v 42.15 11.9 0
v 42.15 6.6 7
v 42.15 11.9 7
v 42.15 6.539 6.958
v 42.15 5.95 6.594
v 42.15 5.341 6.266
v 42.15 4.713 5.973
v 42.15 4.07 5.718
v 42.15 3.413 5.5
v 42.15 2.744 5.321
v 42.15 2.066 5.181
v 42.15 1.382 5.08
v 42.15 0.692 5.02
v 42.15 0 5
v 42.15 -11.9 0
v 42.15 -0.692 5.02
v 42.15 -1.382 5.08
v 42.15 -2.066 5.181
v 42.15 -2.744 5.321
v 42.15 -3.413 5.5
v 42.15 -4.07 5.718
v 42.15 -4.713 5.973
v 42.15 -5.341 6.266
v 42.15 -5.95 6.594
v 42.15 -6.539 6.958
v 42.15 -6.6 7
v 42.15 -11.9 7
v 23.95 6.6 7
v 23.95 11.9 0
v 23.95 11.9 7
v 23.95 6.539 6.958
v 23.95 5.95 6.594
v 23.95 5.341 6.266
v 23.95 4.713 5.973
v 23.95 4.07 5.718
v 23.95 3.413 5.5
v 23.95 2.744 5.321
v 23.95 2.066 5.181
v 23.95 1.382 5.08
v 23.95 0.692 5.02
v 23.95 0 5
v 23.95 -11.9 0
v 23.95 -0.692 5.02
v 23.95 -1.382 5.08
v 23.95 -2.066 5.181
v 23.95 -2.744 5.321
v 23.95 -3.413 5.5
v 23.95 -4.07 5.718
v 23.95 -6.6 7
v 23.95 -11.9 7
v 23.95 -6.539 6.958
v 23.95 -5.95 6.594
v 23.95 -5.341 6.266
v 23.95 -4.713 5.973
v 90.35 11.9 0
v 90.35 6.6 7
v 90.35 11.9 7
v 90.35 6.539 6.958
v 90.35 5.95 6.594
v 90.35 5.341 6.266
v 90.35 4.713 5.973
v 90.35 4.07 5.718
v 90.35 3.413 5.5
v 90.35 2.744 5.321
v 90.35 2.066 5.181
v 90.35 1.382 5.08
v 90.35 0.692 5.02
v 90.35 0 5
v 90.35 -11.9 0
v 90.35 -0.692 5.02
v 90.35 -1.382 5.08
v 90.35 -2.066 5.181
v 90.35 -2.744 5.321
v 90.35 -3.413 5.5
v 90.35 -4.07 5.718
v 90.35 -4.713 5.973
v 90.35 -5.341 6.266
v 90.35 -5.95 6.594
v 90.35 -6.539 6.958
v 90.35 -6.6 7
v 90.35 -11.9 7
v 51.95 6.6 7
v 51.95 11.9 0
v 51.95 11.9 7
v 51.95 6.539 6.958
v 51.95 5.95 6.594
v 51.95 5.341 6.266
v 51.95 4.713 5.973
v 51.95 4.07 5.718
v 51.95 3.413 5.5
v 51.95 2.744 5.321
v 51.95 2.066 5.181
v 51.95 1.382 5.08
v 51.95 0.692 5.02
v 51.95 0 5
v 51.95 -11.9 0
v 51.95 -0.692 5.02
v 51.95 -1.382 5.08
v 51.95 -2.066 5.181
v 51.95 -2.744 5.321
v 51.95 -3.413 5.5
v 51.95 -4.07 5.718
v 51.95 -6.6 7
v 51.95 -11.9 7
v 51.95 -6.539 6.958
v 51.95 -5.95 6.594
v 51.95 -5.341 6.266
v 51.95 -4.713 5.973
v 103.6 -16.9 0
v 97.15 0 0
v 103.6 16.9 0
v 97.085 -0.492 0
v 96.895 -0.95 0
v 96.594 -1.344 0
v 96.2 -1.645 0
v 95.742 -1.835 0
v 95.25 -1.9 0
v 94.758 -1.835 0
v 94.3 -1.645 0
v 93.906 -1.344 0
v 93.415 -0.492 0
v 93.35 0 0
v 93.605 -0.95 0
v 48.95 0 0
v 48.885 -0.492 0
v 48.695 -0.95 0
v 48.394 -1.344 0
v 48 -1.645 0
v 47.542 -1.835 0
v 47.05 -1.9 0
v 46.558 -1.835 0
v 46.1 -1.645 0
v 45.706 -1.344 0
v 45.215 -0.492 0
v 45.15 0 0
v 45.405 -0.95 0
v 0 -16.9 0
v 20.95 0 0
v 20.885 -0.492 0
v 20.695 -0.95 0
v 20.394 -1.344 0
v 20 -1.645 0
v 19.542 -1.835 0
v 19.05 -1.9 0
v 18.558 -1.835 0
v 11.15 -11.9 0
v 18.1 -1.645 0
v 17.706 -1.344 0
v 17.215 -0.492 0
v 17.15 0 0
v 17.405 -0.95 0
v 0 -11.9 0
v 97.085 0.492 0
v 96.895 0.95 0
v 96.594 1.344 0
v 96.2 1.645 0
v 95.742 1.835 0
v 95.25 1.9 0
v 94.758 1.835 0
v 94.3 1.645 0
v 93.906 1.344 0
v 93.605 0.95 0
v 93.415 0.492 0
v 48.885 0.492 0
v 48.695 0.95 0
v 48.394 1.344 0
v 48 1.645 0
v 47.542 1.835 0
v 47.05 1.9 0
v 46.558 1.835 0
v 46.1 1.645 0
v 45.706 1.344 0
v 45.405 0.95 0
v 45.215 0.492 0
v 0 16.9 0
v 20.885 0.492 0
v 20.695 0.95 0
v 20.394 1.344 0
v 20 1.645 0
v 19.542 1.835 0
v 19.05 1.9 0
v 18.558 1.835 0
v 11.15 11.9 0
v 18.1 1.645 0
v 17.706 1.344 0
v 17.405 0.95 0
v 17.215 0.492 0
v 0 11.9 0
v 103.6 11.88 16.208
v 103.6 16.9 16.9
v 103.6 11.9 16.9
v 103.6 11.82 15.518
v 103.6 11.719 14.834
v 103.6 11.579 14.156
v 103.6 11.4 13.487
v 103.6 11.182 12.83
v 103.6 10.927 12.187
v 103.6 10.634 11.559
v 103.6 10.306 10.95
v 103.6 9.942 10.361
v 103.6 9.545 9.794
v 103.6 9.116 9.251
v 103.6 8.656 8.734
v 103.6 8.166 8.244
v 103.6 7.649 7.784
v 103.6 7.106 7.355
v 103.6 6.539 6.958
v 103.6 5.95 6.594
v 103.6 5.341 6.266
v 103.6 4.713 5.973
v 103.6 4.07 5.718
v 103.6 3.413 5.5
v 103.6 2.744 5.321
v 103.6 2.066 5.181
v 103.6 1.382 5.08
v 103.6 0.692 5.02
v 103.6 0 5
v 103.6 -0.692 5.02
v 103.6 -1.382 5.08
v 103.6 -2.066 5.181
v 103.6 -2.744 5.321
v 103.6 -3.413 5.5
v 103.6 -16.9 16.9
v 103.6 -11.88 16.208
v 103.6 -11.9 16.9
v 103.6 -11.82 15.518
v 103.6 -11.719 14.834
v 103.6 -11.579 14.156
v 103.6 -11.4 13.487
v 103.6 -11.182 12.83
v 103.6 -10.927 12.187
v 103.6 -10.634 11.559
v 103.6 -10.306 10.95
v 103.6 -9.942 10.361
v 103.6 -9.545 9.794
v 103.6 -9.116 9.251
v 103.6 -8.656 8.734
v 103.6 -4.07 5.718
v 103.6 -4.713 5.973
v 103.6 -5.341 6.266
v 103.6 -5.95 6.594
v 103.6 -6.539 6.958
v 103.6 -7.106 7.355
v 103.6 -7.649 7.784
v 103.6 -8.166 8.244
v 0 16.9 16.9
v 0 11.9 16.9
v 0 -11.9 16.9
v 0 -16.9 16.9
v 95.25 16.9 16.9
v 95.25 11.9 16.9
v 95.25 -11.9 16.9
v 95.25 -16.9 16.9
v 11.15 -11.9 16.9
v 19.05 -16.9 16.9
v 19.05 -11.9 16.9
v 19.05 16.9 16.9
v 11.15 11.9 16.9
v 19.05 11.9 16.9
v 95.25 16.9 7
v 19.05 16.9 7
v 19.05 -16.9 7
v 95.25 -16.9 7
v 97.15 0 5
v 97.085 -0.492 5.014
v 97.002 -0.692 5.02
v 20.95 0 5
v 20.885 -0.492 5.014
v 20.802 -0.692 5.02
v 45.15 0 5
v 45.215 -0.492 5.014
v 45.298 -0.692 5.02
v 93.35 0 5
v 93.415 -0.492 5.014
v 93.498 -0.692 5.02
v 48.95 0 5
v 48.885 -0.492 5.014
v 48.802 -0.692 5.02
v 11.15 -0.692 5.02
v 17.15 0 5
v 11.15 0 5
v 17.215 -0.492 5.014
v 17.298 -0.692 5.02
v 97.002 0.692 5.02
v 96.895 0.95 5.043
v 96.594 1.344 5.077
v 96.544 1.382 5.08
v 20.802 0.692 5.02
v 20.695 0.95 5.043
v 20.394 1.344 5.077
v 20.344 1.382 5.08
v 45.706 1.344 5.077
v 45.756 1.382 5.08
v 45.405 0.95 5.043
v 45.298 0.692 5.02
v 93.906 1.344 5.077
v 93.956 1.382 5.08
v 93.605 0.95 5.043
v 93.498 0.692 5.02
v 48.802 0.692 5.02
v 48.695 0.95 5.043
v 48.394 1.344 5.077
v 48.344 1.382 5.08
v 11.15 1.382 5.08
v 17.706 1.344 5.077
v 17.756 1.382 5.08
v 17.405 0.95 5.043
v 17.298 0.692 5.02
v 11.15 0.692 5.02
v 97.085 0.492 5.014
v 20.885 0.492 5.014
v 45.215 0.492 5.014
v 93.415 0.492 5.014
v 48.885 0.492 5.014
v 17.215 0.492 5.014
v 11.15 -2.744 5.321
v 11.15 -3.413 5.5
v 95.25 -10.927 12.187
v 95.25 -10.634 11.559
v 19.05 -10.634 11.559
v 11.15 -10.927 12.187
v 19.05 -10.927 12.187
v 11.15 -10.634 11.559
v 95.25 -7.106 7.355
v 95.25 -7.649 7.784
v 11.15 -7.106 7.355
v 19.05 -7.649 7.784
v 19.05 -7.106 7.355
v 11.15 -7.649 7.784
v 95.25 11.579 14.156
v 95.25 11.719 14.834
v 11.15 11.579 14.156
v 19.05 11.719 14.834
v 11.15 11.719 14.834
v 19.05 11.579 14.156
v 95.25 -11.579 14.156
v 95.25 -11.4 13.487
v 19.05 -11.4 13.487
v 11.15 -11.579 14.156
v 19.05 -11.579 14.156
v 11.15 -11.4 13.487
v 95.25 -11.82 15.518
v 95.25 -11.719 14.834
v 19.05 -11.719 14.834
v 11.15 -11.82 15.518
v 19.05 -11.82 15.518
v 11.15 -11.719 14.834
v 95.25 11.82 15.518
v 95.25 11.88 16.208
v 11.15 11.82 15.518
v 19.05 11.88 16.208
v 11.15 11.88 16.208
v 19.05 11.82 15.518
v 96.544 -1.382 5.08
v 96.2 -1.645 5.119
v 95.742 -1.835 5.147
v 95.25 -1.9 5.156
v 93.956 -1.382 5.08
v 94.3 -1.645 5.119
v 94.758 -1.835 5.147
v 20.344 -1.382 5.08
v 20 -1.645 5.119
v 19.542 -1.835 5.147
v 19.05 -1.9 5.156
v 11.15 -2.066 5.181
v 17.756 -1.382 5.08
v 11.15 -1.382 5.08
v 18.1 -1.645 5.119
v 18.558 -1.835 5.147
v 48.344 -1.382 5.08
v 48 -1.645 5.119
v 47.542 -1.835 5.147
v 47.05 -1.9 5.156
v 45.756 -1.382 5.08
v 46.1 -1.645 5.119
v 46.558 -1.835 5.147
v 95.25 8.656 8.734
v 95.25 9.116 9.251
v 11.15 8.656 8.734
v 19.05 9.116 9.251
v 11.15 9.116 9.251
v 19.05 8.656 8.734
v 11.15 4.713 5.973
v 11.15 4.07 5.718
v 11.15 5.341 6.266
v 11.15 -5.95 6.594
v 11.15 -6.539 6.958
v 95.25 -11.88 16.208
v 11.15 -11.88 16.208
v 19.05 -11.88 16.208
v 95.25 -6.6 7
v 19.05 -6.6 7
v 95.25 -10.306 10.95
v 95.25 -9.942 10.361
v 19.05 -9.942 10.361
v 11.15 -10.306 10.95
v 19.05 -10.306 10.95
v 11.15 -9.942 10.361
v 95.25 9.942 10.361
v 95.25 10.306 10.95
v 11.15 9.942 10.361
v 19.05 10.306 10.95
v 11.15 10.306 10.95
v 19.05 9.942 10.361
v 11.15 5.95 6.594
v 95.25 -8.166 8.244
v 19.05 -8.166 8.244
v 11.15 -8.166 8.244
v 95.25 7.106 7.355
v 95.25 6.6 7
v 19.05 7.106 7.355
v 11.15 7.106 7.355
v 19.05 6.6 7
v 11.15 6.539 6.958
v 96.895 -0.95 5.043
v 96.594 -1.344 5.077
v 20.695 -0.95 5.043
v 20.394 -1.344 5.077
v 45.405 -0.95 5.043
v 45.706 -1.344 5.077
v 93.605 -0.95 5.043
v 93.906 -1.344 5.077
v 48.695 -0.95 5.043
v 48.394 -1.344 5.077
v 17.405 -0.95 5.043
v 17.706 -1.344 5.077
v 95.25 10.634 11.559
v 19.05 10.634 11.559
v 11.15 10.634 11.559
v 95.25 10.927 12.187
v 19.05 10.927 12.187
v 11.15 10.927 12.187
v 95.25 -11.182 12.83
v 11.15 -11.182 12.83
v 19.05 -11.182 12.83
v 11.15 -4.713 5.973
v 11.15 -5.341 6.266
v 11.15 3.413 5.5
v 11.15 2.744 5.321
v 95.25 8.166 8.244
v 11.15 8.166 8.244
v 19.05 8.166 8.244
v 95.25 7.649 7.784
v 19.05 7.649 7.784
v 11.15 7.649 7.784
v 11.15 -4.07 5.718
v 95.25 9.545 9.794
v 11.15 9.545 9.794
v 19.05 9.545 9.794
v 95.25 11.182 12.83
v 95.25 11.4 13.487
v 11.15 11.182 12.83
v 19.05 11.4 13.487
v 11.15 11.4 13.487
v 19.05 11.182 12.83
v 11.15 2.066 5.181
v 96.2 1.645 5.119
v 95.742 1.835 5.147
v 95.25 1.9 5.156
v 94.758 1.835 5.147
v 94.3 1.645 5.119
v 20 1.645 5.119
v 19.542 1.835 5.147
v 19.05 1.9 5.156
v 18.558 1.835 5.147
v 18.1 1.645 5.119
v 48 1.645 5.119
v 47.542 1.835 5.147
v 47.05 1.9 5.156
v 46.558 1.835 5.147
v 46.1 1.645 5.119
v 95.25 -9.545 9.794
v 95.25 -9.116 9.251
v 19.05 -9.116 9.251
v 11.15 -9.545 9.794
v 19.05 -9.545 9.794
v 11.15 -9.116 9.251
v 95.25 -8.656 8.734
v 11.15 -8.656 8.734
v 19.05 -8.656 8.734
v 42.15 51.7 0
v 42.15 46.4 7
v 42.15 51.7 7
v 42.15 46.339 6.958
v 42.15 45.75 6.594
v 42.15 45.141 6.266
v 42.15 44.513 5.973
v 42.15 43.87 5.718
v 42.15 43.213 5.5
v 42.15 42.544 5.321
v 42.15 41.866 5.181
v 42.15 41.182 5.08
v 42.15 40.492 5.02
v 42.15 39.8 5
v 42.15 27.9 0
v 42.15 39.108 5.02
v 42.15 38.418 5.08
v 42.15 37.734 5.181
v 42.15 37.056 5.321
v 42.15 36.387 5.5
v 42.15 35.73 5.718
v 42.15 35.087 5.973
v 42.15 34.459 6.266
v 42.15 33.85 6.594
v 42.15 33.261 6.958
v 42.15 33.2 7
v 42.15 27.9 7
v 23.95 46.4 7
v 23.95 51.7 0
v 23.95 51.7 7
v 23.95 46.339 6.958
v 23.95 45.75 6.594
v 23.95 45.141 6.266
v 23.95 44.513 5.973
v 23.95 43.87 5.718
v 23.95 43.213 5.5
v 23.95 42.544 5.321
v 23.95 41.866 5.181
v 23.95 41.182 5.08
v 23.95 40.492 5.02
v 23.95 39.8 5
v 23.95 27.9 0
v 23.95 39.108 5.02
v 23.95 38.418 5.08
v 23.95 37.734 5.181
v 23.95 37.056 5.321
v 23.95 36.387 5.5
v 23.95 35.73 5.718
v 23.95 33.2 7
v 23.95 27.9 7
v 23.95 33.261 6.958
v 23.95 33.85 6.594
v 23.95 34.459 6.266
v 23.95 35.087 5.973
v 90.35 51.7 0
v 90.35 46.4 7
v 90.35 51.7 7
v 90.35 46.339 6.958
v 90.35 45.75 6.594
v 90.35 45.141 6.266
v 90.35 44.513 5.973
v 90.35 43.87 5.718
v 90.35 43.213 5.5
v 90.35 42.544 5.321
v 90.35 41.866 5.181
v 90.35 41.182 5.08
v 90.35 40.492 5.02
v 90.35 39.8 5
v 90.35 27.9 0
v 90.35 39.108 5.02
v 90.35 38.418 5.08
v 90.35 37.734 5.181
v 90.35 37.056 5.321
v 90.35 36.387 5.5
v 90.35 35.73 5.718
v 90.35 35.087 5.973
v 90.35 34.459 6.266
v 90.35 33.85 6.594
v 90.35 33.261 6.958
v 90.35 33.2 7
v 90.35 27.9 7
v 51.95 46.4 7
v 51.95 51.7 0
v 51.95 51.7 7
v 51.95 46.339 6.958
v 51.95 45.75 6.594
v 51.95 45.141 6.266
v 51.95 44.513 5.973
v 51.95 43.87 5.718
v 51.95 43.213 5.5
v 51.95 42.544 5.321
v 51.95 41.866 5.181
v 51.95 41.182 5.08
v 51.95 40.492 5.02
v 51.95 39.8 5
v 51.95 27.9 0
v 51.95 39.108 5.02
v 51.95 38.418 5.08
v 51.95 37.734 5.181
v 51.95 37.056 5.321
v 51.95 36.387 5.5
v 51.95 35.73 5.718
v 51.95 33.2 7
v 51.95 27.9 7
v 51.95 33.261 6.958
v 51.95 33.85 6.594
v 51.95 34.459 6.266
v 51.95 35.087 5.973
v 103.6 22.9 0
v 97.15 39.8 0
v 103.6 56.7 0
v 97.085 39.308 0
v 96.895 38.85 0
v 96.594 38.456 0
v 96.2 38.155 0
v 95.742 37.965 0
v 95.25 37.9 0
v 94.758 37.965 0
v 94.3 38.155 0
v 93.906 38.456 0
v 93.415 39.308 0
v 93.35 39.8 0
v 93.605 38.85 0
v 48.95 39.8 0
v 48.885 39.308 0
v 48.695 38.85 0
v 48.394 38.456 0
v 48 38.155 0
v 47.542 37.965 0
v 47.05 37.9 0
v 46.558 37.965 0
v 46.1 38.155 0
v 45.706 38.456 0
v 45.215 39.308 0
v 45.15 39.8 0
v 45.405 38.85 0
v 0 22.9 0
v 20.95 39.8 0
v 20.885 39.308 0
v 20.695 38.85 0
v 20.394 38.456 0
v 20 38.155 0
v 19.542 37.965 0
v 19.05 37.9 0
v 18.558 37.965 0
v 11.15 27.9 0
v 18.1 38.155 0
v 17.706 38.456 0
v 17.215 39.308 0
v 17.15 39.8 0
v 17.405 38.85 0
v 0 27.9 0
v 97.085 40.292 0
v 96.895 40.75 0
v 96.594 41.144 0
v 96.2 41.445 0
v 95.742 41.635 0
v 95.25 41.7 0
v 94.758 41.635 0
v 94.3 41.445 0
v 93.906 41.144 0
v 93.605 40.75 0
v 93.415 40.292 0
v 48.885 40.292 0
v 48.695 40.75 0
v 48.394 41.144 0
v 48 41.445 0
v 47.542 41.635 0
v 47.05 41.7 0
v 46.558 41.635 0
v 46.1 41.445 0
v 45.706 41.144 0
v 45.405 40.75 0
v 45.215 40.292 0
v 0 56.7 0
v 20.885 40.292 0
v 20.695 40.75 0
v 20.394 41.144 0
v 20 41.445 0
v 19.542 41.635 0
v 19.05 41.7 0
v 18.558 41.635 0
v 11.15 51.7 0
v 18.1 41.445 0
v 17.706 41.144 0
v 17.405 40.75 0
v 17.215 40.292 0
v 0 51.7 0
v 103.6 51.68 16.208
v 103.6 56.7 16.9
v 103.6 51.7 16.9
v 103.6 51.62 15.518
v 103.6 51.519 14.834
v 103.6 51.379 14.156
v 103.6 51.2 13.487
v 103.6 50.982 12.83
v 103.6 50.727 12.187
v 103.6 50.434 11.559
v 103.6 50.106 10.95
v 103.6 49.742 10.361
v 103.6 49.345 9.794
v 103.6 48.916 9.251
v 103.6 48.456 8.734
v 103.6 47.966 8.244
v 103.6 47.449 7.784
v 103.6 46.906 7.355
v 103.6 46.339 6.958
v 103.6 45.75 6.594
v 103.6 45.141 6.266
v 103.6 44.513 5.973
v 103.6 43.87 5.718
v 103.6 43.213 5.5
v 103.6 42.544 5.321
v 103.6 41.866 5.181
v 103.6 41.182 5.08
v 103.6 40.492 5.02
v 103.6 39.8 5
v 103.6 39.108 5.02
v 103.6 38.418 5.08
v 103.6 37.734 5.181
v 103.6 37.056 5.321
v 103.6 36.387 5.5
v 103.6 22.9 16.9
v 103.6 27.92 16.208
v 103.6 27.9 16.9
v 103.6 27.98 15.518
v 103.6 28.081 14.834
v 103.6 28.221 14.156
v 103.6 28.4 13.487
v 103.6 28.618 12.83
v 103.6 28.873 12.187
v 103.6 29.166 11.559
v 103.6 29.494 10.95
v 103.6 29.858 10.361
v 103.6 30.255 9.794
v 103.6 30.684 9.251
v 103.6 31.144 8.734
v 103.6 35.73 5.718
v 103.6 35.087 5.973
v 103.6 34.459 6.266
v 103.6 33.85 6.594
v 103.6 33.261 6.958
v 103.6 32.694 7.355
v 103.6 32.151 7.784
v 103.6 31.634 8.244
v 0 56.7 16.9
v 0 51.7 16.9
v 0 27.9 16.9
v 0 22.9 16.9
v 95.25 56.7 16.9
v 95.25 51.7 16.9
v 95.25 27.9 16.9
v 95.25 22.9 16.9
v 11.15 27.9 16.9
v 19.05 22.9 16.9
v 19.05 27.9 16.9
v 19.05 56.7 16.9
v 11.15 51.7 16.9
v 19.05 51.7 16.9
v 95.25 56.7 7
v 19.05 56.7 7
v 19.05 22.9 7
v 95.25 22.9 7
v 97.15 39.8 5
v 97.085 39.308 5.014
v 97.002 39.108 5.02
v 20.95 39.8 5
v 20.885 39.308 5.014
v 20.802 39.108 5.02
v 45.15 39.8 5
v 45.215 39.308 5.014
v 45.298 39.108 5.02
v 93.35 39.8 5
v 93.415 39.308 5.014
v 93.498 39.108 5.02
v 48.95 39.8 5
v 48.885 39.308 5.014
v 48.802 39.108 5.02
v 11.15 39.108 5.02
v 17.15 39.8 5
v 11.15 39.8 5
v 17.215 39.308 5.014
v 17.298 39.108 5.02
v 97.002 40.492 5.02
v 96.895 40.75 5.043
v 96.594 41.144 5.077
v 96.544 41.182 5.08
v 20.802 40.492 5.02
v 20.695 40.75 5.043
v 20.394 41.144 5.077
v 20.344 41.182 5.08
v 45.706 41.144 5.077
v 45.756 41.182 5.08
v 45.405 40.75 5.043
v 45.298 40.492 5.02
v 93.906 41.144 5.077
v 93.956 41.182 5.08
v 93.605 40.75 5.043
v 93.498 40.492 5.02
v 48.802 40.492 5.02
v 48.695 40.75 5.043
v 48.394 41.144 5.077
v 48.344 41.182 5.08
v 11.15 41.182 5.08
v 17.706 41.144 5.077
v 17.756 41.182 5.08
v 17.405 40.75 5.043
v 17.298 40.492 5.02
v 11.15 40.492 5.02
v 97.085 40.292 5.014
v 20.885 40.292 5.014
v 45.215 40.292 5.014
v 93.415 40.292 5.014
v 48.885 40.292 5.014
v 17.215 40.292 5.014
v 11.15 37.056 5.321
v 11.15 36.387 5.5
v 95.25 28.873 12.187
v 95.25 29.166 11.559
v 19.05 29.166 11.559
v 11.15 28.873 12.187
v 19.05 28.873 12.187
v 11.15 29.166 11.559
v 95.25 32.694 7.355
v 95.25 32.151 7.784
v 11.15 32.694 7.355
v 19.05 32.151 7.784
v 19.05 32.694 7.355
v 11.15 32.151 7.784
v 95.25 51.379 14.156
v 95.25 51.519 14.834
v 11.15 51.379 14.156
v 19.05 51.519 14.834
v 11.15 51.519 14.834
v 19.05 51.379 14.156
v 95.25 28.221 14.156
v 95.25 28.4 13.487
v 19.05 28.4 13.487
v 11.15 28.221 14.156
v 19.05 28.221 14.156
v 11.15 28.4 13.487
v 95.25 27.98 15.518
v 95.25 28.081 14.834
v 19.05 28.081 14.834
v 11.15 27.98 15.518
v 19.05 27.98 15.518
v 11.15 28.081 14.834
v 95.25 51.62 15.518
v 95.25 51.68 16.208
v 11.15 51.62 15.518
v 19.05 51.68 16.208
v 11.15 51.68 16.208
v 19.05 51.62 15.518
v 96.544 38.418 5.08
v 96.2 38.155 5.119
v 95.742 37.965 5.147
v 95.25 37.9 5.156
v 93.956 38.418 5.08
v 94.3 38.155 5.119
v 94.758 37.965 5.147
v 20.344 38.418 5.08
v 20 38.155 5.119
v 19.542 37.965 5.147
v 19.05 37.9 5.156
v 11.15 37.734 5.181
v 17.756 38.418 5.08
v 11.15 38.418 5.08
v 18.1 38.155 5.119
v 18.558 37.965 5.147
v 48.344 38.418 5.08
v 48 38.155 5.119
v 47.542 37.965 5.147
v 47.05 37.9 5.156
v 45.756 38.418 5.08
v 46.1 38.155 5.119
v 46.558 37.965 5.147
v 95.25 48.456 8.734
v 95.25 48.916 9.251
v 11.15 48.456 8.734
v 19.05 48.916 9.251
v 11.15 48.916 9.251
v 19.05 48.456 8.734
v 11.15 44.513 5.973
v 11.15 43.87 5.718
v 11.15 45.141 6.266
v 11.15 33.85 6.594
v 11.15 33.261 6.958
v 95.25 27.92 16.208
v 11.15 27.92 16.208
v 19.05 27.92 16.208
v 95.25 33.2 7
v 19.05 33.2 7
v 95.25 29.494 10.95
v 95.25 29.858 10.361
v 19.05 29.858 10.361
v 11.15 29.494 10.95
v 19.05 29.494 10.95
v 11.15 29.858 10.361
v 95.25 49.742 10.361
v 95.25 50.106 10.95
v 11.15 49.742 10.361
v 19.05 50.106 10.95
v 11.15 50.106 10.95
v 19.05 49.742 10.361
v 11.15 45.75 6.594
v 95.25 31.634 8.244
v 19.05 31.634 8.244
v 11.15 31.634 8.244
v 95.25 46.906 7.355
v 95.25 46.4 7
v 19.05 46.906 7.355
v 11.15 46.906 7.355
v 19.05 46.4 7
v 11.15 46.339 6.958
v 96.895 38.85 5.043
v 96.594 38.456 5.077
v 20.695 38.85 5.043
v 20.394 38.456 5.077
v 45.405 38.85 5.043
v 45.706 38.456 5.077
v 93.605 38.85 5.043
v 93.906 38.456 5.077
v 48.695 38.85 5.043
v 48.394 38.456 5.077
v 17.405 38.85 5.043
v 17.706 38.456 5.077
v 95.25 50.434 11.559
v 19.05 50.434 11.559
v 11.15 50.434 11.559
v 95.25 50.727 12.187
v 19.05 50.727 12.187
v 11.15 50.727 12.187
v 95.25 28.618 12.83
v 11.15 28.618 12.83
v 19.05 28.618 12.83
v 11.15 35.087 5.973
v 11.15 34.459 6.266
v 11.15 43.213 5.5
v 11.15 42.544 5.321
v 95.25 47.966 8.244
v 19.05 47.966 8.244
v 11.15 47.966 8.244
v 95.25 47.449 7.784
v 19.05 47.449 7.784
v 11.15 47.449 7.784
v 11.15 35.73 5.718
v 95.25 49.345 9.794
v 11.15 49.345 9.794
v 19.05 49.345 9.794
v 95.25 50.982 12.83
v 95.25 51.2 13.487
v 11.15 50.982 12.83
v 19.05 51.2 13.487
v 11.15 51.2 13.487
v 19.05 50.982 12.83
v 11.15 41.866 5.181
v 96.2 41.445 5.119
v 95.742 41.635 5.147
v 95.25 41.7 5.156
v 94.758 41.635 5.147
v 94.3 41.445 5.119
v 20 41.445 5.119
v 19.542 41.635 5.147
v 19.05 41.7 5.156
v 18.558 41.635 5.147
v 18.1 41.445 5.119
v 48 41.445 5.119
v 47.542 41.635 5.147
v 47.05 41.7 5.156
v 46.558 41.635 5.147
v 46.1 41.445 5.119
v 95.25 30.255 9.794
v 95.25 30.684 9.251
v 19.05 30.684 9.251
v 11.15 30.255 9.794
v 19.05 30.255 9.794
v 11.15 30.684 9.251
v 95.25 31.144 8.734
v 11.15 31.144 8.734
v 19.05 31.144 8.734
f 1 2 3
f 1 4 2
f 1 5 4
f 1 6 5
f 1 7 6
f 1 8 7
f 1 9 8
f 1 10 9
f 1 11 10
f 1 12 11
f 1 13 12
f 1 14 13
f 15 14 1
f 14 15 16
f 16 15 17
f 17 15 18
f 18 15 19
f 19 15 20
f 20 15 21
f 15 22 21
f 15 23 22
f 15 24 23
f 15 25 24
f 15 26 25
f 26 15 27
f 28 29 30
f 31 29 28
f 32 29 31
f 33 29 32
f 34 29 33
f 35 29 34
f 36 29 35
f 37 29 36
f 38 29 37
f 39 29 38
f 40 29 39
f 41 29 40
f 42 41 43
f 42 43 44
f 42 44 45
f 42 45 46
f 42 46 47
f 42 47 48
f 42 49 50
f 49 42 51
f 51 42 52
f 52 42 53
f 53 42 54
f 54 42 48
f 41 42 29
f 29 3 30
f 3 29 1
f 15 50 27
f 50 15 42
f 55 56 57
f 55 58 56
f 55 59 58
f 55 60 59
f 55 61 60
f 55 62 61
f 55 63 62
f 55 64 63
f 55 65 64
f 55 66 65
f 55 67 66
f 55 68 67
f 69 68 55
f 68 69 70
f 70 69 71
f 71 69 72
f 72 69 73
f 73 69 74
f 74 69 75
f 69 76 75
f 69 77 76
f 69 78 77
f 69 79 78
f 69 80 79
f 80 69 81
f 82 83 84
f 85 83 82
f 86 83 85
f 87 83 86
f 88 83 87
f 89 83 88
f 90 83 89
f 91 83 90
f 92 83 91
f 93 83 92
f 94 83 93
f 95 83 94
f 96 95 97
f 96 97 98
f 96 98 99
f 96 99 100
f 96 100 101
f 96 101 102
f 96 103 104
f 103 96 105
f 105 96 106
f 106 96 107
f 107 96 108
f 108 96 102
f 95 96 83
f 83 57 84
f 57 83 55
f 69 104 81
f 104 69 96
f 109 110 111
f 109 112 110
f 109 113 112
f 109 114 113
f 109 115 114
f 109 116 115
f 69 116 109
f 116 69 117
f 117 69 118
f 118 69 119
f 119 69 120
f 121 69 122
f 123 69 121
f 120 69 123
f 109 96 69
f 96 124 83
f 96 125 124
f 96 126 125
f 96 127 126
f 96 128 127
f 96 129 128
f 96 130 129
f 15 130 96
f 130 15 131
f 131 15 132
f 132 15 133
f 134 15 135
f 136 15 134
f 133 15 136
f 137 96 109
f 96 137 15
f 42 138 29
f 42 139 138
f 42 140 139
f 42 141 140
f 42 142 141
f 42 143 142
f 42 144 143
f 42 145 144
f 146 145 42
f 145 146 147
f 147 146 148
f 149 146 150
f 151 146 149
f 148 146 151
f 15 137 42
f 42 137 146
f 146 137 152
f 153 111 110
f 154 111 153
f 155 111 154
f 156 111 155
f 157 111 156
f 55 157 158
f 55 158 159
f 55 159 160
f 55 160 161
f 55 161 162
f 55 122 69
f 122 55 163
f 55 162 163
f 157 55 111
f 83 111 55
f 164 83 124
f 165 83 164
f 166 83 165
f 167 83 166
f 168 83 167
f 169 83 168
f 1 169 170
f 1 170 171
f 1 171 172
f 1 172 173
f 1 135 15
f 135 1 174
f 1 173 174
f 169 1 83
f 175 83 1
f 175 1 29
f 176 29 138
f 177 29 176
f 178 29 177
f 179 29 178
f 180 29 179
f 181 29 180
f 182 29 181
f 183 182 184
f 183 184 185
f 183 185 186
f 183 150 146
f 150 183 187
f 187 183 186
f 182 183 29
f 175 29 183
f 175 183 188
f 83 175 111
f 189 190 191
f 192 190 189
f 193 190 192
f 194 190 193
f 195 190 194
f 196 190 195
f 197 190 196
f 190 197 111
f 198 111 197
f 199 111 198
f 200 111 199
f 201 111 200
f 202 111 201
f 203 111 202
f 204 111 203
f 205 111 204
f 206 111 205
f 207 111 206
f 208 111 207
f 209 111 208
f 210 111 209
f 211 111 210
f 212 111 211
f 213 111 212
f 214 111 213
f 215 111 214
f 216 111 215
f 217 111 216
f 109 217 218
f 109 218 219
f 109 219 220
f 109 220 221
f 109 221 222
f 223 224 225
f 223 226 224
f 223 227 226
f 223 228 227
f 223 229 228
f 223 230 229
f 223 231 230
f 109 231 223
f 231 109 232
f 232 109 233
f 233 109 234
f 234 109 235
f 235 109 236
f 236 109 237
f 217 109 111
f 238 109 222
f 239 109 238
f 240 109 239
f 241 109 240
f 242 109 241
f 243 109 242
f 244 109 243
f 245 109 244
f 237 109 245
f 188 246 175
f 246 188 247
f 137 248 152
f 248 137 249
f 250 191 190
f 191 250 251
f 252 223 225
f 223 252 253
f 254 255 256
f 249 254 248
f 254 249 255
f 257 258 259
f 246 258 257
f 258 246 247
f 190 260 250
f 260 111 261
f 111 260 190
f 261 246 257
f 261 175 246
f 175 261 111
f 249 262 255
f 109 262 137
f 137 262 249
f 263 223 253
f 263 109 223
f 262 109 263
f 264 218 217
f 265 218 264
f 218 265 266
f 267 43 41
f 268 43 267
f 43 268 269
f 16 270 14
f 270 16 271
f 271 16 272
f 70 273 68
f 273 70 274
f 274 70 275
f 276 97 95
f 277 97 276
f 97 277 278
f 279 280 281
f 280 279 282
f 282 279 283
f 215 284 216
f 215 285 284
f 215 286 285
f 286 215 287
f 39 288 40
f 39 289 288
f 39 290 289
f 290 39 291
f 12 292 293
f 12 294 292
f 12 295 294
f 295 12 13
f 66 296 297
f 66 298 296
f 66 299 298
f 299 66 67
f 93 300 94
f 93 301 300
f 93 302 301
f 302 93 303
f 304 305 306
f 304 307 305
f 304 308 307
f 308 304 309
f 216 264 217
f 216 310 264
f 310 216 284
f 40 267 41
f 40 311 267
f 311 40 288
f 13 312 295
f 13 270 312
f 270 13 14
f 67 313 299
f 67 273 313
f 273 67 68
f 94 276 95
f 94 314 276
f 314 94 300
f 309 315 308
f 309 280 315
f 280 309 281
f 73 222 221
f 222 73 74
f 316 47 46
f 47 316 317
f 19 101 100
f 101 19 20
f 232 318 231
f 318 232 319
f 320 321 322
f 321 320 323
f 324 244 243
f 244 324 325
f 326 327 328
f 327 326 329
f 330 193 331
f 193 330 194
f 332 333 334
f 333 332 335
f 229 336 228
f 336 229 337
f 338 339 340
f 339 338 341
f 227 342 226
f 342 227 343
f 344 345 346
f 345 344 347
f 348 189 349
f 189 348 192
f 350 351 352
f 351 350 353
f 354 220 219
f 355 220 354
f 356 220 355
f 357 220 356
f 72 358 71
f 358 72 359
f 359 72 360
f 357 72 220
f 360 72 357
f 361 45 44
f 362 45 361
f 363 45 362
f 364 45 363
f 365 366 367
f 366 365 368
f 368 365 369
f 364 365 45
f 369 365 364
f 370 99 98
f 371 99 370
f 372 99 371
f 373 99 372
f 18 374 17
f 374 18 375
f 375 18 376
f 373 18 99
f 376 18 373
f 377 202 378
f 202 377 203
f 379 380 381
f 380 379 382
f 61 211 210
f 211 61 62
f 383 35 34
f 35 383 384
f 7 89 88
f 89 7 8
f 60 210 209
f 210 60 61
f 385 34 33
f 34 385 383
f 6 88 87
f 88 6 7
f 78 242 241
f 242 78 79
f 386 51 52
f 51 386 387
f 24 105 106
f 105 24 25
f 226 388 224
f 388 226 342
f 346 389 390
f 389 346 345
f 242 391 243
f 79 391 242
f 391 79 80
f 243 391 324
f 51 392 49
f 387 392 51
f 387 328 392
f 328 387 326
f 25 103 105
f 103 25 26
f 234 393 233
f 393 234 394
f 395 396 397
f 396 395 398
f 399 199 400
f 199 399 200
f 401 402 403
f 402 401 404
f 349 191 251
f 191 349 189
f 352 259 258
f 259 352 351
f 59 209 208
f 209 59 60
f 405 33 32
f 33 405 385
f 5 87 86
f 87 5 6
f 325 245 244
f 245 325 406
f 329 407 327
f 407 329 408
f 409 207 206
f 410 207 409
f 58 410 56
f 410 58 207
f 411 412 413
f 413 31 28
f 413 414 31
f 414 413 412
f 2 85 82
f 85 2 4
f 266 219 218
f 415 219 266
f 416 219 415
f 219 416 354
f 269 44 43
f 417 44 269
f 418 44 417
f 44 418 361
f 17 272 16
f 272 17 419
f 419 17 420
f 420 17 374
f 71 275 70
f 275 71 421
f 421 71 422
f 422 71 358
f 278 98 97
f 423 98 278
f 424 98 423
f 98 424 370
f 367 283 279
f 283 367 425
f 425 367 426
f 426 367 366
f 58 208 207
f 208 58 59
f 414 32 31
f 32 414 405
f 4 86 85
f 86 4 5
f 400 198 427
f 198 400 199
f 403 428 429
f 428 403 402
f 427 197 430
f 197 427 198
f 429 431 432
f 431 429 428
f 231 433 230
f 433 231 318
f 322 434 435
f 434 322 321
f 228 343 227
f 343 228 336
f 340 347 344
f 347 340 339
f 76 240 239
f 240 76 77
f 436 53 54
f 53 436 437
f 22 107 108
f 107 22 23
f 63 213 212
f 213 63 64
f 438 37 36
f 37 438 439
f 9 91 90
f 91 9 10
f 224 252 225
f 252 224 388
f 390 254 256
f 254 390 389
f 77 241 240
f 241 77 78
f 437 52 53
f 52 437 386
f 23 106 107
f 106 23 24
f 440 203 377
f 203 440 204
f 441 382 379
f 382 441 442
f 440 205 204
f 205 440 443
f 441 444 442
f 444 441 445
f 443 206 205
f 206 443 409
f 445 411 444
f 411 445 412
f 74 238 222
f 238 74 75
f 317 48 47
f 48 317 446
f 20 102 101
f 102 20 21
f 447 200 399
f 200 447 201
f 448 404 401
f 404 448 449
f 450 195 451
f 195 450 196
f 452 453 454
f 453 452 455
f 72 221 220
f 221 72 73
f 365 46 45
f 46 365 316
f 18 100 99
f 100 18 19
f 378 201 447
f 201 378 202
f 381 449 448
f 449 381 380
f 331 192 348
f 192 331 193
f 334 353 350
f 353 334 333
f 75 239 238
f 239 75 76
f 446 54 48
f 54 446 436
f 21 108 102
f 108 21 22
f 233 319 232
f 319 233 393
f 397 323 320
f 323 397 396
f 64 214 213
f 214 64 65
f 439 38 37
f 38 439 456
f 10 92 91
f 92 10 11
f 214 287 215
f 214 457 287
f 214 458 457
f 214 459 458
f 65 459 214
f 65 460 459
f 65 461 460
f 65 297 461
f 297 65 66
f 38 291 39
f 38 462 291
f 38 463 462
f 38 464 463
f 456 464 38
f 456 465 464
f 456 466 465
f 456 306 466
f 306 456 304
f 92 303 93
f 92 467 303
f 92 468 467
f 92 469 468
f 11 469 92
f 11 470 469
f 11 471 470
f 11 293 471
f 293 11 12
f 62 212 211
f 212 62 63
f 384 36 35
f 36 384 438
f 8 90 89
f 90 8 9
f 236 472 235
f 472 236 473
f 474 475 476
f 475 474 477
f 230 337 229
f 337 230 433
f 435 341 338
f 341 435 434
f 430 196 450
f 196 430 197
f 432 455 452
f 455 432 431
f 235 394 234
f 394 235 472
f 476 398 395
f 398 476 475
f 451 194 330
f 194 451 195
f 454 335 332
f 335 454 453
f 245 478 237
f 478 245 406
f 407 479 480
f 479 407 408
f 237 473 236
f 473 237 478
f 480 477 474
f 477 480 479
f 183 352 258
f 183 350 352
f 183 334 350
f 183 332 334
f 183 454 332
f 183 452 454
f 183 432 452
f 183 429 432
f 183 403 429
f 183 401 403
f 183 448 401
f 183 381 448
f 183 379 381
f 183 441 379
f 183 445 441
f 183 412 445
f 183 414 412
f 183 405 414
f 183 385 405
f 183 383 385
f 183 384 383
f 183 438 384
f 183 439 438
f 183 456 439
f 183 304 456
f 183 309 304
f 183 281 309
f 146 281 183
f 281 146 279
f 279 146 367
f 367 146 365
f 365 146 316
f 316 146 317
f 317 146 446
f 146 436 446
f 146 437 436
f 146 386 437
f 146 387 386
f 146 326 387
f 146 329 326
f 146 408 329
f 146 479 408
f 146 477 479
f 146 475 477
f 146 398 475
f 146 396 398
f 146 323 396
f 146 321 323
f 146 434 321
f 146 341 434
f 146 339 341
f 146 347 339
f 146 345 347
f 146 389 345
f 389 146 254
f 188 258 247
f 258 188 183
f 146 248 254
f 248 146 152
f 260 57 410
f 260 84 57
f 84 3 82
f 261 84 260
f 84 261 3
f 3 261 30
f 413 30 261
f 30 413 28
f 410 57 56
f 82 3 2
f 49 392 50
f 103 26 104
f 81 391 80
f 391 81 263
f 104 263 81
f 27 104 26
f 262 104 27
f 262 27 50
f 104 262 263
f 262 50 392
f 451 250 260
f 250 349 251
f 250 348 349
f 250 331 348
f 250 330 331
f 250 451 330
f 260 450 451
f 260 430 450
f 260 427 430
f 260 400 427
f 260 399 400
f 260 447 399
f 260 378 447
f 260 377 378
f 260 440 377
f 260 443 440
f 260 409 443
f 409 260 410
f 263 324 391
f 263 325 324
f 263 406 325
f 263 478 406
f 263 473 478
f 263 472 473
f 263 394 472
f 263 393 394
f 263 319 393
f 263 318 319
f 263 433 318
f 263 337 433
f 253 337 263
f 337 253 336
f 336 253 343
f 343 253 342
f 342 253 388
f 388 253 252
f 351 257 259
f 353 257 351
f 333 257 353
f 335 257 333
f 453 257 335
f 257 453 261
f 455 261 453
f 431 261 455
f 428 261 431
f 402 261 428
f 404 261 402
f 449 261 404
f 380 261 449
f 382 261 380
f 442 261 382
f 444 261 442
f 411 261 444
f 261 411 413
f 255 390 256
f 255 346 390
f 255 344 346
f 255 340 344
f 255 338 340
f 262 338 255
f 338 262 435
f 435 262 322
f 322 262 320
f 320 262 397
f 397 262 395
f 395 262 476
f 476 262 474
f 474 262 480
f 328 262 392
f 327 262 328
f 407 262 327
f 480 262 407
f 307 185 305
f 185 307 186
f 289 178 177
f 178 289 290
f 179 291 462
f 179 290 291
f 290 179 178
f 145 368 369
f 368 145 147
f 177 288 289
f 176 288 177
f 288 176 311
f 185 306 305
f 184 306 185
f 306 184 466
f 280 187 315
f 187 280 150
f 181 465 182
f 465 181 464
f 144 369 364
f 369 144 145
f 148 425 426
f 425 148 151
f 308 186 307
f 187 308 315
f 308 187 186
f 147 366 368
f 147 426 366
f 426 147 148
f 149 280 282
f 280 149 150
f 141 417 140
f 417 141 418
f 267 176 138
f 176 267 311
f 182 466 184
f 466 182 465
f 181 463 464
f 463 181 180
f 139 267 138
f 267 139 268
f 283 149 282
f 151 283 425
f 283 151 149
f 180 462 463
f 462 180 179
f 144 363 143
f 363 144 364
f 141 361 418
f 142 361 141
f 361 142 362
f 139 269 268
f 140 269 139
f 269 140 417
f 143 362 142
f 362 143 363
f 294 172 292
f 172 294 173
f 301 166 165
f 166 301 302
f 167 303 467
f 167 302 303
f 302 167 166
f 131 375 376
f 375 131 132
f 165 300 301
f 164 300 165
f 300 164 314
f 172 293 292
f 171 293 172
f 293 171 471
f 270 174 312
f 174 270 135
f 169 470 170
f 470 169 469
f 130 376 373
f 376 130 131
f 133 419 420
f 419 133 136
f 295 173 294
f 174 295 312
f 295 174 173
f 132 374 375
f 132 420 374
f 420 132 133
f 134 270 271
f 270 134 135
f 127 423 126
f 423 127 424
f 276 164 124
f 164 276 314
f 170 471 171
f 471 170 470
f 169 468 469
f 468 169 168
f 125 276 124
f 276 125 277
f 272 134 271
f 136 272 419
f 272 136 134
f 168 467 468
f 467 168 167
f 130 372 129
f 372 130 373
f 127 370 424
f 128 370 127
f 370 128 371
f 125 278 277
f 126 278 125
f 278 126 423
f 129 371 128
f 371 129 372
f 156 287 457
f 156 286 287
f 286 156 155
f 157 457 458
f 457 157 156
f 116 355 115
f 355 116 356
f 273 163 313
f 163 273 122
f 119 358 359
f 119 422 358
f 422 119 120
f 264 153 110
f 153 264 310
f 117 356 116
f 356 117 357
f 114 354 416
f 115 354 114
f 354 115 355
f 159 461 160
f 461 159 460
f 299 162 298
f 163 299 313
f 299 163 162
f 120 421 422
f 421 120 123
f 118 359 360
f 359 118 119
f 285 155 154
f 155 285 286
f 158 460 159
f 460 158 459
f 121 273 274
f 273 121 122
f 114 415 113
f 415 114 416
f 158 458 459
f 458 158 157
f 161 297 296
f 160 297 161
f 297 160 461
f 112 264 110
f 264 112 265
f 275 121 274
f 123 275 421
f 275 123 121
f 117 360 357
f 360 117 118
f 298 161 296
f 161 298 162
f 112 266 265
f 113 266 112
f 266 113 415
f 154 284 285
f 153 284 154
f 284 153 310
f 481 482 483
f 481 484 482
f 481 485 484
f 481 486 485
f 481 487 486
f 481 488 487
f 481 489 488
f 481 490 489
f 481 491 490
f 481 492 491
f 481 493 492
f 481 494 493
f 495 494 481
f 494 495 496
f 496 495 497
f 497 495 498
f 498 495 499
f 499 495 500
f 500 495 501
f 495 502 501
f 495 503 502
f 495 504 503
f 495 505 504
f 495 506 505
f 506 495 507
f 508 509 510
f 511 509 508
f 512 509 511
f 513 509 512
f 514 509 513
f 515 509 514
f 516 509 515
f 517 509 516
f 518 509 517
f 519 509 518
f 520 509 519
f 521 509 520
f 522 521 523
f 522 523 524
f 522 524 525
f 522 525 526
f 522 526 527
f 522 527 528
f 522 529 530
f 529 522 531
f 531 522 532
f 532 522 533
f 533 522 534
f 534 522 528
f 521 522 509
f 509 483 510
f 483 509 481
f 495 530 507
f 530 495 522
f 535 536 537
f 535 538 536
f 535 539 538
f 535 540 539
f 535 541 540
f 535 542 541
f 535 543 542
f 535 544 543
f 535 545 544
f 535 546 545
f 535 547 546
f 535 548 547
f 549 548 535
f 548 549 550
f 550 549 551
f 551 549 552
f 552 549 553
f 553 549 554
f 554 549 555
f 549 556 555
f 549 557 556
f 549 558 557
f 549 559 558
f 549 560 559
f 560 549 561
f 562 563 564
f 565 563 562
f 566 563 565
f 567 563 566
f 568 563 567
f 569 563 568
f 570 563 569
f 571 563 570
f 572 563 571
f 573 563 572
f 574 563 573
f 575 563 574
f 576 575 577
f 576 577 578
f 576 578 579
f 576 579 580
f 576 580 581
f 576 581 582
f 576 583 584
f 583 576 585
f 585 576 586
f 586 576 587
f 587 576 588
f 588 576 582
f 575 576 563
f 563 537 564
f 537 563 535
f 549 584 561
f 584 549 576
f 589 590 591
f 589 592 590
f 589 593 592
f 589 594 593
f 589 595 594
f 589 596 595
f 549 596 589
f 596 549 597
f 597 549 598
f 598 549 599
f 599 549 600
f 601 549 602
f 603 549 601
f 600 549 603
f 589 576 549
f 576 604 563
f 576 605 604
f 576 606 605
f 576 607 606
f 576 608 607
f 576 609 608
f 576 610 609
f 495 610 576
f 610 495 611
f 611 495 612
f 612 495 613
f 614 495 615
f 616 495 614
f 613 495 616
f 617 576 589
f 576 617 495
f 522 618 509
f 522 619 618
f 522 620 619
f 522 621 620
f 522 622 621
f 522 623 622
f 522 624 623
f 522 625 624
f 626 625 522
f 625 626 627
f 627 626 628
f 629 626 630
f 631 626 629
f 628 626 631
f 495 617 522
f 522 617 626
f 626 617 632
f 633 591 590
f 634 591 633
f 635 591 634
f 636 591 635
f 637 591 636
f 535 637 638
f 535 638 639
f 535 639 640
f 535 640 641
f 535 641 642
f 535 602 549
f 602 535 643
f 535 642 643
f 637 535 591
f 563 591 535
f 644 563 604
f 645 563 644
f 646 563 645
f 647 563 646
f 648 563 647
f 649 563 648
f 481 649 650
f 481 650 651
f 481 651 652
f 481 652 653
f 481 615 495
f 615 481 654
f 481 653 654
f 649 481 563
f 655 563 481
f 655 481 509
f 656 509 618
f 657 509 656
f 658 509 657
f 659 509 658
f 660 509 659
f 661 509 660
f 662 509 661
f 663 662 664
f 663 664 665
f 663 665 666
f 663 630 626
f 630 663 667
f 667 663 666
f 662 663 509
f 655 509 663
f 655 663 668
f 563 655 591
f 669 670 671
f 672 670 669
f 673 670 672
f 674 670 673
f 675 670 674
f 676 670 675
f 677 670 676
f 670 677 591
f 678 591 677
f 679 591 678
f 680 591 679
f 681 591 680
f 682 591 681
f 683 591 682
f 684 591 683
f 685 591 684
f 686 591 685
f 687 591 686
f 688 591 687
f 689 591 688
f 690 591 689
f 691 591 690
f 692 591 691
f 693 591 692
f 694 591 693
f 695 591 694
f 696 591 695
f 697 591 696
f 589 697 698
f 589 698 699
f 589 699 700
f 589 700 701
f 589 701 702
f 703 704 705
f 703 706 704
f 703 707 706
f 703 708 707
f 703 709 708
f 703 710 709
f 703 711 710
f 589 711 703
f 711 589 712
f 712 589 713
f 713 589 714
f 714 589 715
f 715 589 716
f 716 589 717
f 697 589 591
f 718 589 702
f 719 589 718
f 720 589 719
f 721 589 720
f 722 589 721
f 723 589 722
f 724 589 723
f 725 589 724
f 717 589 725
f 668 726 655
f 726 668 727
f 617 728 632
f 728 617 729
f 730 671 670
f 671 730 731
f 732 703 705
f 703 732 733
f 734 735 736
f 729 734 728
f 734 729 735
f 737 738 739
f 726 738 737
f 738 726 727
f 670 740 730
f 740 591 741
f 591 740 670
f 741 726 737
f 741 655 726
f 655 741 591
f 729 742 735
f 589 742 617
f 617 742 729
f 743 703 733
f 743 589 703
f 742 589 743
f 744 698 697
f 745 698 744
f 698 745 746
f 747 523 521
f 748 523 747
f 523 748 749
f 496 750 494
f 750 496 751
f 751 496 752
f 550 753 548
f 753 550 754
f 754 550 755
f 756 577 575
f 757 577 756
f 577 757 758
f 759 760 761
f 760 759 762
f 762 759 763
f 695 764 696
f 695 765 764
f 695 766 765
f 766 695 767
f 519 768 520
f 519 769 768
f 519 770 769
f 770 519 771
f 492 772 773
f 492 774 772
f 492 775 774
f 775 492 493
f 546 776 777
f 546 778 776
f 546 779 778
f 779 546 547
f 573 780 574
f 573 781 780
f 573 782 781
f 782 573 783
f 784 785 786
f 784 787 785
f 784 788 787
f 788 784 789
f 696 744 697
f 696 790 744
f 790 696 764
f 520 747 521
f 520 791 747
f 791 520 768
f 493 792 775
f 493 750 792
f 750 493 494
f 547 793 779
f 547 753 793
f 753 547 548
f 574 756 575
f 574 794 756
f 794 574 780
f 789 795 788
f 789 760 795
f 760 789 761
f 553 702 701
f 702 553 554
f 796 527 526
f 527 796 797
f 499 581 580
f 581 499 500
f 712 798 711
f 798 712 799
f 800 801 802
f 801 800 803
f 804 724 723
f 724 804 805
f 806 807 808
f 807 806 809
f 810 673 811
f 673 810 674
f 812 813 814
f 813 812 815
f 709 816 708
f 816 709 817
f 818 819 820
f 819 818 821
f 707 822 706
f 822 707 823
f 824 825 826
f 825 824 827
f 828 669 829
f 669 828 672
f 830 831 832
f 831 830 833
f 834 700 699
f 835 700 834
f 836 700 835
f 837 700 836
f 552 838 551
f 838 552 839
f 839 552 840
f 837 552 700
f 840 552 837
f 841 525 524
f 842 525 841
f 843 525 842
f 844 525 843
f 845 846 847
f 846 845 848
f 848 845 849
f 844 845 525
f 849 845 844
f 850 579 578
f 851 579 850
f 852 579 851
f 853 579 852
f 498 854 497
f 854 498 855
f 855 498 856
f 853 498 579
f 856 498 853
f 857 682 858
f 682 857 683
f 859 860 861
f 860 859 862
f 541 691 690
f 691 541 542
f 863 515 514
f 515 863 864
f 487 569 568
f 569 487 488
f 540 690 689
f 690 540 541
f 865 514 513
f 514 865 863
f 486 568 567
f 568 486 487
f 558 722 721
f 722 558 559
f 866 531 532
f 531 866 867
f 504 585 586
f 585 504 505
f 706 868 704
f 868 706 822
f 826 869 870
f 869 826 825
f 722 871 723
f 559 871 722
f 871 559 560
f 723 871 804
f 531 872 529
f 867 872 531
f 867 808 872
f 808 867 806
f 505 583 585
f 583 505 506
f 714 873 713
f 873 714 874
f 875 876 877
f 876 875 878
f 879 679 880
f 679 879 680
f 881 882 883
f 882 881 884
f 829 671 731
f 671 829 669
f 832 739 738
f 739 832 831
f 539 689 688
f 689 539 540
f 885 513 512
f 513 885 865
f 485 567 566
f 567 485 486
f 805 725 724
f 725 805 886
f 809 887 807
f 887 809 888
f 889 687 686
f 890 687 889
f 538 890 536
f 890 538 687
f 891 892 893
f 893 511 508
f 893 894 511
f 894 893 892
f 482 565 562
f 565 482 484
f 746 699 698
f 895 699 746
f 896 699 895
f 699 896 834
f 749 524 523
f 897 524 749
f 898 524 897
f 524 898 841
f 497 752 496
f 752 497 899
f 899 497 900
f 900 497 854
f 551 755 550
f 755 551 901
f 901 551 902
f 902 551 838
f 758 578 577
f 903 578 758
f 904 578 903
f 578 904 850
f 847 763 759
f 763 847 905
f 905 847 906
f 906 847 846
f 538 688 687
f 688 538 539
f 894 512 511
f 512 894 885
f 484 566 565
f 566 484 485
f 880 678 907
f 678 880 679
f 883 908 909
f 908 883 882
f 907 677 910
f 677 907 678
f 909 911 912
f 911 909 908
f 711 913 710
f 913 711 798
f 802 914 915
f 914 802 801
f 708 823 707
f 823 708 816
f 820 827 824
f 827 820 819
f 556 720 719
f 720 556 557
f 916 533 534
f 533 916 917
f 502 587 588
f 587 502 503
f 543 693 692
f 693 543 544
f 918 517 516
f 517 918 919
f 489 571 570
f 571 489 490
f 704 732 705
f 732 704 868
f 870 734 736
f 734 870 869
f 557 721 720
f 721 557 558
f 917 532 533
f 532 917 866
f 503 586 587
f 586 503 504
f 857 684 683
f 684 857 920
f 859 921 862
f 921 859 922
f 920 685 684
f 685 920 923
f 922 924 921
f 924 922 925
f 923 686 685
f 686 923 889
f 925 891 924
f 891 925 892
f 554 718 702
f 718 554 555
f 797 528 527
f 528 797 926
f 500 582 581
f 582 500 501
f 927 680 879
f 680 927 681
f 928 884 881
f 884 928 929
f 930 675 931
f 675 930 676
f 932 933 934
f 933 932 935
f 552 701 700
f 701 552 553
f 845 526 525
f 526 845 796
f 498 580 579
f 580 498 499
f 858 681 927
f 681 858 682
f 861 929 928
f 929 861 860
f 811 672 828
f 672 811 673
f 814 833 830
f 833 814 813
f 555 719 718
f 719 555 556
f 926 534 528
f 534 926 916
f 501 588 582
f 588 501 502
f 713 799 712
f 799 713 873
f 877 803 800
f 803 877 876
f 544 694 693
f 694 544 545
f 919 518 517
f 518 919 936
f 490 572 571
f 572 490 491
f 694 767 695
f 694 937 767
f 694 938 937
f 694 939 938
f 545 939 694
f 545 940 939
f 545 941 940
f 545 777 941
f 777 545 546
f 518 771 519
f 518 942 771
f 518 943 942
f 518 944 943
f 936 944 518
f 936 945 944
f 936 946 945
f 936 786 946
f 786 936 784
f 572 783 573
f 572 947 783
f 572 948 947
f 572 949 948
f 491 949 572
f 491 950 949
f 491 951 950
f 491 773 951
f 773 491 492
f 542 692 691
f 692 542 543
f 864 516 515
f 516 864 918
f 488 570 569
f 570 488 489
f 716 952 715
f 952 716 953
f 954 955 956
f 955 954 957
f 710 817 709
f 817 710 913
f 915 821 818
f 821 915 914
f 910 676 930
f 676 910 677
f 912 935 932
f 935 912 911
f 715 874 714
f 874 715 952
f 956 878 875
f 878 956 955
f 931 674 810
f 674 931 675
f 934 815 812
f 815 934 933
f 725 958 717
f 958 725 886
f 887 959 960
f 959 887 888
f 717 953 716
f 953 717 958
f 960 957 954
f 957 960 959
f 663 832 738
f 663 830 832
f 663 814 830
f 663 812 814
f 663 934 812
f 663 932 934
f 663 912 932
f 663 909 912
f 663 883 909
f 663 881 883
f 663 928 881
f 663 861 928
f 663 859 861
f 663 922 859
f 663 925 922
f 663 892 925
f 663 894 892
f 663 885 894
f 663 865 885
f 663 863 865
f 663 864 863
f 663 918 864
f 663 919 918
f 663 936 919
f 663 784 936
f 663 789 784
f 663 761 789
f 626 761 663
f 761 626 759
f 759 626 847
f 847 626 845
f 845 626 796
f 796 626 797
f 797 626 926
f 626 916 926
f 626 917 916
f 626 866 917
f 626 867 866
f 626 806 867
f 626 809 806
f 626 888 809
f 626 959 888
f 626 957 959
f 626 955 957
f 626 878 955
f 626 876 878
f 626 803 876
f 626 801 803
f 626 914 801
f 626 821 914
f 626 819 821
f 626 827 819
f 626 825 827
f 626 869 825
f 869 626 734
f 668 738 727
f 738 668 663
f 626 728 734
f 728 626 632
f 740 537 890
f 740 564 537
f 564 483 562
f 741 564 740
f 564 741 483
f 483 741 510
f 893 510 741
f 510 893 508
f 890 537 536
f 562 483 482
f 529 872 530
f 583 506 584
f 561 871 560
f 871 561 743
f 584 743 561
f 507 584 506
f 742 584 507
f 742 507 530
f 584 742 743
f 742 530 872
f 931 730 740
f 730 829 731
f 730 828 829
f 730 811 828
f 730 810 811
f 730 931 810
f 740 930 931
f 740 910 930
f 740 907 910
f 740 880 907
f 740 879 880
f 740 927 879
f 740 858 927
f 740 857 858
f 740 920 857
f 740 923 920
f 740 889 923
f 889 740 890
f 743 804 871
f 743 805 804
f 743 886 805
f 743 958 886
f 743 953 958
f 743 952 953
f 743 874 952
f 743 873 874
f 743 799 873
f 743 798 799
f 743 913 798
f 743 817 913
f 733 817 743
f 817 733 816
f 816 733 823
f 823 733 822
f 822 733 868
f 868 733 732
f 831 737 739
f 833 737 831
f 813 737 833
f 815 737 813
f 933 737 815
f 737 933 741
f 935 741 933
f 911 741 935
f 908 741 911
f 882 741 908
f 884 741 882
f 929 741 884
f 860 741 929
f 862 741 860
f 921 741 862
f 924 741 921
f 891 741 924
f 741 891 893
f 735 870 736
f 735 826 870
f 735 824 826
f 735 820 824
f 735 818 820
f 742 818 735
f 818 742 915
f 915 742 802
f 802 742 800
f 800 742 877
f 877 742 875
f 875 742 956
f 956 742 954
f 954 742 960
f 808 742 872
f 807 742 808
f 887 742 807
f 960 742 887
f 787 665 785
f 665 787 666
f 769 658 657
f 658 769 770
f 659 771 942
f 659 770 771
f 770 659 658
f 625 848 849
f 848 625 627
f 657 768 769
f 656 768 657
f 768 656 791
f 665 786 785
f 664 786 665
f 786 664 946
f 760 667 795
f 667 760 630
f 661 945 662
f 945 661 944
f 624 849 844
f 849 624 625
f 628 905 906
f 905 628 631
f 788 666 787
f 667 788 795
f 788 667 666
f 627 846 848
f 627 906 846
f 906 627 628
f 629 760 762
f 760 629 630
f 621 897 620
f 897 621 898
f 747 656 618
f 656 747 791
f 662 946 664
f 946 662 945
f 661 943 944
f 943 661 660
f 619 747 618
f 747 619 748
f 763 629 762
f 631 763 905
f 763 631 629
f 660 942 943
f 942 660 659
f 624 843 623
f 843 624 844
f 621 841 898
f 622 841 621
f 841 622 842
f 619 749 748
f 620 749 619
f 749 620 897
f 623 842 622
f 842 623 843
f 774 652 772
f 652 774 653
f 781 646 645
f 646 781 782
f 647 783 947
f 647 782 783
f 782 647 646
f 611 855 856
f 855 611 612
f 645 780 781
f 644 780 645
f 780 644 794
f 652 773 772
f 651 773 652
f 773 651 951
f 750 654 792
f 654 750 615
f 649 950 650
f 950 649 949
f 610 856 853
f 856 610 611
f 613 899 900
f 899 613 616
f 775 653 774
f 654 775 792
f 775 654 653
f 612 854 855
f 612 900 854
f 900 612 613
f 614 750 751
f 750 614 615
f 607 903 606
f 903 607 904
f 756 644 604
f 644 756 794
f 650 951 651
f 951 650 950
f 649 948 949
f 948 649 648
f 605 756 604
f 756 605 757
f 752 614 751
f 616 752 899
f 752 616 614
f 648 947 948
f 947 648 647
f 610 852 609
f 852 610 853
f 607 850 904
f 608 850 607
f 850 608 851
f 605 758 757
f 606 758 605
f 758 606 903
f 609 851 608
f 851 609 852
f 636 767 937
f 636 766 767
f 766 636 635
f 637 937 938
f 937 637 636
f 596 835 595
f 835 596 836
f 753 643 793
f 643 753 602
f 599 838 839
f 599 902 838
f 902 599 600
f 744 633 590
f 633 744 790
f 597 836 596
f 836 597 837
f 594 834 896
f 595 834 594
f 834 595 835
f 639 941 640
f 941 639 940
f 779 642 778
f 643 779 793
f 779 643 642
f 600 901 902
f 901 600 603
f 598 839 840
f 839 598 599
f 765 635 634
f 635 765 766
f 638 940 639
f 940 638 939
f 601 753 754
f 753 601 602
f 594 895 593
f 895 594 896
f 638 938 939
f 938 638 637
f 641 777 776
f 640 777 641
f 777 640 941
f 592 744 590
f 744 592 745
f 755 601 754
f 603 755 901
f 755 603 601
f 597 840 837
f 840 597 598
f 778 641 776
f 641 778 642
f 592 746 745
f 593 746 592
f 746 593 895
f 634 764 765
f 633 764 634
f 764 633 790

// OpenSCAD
//Drill guide for Mostly Printed CNC Z Pipe
//7/3/2015  By: David Bunch
//Revised center cuts for larger Diameter holes to work better
//
//Designed for Bosch Toolholder with Dust cover using 2 parts
//76.25mm 1st & 3rd hole
//28.01mm 1st & 2nd hole
//48.24mm 2nd & 3rd hole

//CUSTOMIZER VARIABLES

//1. Number of Nuts
NumNuts = 3;    //usually 2, but need 3 for Bosch with Vac attachment

//2. Spacing between Nuts (Standard is 76.2mm)
NutSpacing = 76.2;      //(I used 53mm for the rotary tool I am using)

//3. Spacing between 1st & 2nd Nut
NutSpacing2 = 28;    //Use 0 if only using 2 nuts

//4. Dia of Drill Hole (9/64" Drill bit, Added .2mm for slip fit)
//M3 = 3.8;
DrSize = 3.8;

//5. Pipe Dia. to Use (Added 0.8 for slight tight fit)
OD = 23.8;              //23.7mm was a little tight & 24.0 was a little loose for me

//6. Thickness at bottom of Pipe
Thickness = 5;

//7. Resolution of Pipe (108 gives .688mm length segments)
Pipe_res = 108;

//8. Resolution of holes (24 gives .497mm length segments)
Hole_res = 24;

//9. Offset from Left for 1st Nut Trap
LtNutOffset = 19.05;      //Original Design is 19.05mm

//10. Offset from Right of 2nd Nut Trap (Original is 6.35mm)
RtNutOffset = 8.35;       //(I decided to add 2mm to this gap)

//11. Center Clamp Width
Cl_Wid = 6;

//12. Number of Holes (1 or 2)
Num_Holes=2;

//13. Print 1 or 2 Nut Traps
Qty = 2;

//CUSTOMIZER VARIABLES END
//----------------------------------------
//Begin calculations based on input variables
MidNutOffset = LtNutOffset + NutSpacing2;
echo("MidNutOffset = ", MidNutOffset);
TotCenGap=NutSpacing - DrSize - 12;         //I use 6mm plastic around holes
echo("TotCenGap = ",TotCenGap);

DrRad = DrSize / 2;
echo("DrRad = ", DrRad);
THK = OD /2 + Thickness;

DrLen = OD + Thickness + Thickness+2;

echo("THK = ",THK);

Width = OD + Thickness + Thickness;
echo("Width = ",Width);

WidSlice = Width + 2;
Rad = OD / 2;
echo("Rad = ", Rad);

Ht = LtNutOffset + NutSpacing + RtNutOffset;
echo("Ht = ", Ht);

CenCub_Z2 = LtNutOffset + DrRad + 3;         //6mm of plastic each side of hole

CenCub_Z1 = MidNutOffset + DrRad + 3;

CenCubLen1 = NutSpacing - NutSpacing2 - (6 + DrSize);                     //Use this if Cl_Wid = 0;
//CenCubLen2 = (TotCenGap - Cl_Wid) / 2;
CenCubLen2 = NutSpacing2 - (6 + DrSize);

echo("CenCubLen1 = ", CenCubLen1);
echo("CenCubLen2 = ", CenCubLen2);
//translate([LtNutOffset,0,0])
//%cube([DrRad + 3,4,10]);
module Base()
{
    translate([0,0,THK])
    rotate([0,90,0])
    difference()
    {
        translate([0,-THK])
        cube([THK,Width,Ht]);                   //Basic starting cube
        translate([0,0,-1])
        cylinder(d=OD,h=Ht+2,$fn=Pipe_res);     //Cut for where pipe is laid
        if (Cl_Wid > 0)
        {
            translate([-1,-Rad,CenCub_Z2])
            cube([OD,OD,CenCubLen2]);           //cube cut out of 1st part of center
            translate([-1,-Rad,CenCub_Z1])
            cube([OD,OD,CenCubLen1]);           //cube cut out of 2nd part of center
        } else {
            translate([-1,-Rad,CenCub_Z])
            cube([OD,OD,CenCubLen1]);          //cube cut out of center
        }
        translate([-1,-Rad,-1])
        cube([OD,OD,(LtNutOffset - DrRad - 6) + 1]);         //Slice a cube cut at left side
        translate([-(Thickness+2),-(WidSlice/2),LtNutOffset])
        cube([THK,WidSlice,NutSpacing]);        //Slice across Top for less plastic

        translate([0,0,LtNutOffset])
        rotate([0,90,0])
        cylinder(d=DrSize,h=DrLen,center=true,$fn=Hole_res);       //Drill Bottom Hole
        translate([0,0,LtNutOffset+NutSpacing2])
        rotate([0,90,0])
        cylinder(d=DrSize,h=DrLen,center=true,$fn=Hole_res);       //Drill Middle Hole
        if (Num_Holes == 2)
        {
                translate([0,0,LtNutOffset+NutSpacing])
                rotate([0,90,0])
                cylinder(d=DrSize,h=DrLen,center=true,$fn=Hole_res);    //Drill Top Hole
        }
    }
}
            //translate([-1,-Rad,CenCub_Z])
            //cube([OD,OD,CenCubLen2]);           //cube cut out of 1st part of center
Base();
if (Qty == 2)
{
    translate([0,Width+6,0])
    Base();
}
